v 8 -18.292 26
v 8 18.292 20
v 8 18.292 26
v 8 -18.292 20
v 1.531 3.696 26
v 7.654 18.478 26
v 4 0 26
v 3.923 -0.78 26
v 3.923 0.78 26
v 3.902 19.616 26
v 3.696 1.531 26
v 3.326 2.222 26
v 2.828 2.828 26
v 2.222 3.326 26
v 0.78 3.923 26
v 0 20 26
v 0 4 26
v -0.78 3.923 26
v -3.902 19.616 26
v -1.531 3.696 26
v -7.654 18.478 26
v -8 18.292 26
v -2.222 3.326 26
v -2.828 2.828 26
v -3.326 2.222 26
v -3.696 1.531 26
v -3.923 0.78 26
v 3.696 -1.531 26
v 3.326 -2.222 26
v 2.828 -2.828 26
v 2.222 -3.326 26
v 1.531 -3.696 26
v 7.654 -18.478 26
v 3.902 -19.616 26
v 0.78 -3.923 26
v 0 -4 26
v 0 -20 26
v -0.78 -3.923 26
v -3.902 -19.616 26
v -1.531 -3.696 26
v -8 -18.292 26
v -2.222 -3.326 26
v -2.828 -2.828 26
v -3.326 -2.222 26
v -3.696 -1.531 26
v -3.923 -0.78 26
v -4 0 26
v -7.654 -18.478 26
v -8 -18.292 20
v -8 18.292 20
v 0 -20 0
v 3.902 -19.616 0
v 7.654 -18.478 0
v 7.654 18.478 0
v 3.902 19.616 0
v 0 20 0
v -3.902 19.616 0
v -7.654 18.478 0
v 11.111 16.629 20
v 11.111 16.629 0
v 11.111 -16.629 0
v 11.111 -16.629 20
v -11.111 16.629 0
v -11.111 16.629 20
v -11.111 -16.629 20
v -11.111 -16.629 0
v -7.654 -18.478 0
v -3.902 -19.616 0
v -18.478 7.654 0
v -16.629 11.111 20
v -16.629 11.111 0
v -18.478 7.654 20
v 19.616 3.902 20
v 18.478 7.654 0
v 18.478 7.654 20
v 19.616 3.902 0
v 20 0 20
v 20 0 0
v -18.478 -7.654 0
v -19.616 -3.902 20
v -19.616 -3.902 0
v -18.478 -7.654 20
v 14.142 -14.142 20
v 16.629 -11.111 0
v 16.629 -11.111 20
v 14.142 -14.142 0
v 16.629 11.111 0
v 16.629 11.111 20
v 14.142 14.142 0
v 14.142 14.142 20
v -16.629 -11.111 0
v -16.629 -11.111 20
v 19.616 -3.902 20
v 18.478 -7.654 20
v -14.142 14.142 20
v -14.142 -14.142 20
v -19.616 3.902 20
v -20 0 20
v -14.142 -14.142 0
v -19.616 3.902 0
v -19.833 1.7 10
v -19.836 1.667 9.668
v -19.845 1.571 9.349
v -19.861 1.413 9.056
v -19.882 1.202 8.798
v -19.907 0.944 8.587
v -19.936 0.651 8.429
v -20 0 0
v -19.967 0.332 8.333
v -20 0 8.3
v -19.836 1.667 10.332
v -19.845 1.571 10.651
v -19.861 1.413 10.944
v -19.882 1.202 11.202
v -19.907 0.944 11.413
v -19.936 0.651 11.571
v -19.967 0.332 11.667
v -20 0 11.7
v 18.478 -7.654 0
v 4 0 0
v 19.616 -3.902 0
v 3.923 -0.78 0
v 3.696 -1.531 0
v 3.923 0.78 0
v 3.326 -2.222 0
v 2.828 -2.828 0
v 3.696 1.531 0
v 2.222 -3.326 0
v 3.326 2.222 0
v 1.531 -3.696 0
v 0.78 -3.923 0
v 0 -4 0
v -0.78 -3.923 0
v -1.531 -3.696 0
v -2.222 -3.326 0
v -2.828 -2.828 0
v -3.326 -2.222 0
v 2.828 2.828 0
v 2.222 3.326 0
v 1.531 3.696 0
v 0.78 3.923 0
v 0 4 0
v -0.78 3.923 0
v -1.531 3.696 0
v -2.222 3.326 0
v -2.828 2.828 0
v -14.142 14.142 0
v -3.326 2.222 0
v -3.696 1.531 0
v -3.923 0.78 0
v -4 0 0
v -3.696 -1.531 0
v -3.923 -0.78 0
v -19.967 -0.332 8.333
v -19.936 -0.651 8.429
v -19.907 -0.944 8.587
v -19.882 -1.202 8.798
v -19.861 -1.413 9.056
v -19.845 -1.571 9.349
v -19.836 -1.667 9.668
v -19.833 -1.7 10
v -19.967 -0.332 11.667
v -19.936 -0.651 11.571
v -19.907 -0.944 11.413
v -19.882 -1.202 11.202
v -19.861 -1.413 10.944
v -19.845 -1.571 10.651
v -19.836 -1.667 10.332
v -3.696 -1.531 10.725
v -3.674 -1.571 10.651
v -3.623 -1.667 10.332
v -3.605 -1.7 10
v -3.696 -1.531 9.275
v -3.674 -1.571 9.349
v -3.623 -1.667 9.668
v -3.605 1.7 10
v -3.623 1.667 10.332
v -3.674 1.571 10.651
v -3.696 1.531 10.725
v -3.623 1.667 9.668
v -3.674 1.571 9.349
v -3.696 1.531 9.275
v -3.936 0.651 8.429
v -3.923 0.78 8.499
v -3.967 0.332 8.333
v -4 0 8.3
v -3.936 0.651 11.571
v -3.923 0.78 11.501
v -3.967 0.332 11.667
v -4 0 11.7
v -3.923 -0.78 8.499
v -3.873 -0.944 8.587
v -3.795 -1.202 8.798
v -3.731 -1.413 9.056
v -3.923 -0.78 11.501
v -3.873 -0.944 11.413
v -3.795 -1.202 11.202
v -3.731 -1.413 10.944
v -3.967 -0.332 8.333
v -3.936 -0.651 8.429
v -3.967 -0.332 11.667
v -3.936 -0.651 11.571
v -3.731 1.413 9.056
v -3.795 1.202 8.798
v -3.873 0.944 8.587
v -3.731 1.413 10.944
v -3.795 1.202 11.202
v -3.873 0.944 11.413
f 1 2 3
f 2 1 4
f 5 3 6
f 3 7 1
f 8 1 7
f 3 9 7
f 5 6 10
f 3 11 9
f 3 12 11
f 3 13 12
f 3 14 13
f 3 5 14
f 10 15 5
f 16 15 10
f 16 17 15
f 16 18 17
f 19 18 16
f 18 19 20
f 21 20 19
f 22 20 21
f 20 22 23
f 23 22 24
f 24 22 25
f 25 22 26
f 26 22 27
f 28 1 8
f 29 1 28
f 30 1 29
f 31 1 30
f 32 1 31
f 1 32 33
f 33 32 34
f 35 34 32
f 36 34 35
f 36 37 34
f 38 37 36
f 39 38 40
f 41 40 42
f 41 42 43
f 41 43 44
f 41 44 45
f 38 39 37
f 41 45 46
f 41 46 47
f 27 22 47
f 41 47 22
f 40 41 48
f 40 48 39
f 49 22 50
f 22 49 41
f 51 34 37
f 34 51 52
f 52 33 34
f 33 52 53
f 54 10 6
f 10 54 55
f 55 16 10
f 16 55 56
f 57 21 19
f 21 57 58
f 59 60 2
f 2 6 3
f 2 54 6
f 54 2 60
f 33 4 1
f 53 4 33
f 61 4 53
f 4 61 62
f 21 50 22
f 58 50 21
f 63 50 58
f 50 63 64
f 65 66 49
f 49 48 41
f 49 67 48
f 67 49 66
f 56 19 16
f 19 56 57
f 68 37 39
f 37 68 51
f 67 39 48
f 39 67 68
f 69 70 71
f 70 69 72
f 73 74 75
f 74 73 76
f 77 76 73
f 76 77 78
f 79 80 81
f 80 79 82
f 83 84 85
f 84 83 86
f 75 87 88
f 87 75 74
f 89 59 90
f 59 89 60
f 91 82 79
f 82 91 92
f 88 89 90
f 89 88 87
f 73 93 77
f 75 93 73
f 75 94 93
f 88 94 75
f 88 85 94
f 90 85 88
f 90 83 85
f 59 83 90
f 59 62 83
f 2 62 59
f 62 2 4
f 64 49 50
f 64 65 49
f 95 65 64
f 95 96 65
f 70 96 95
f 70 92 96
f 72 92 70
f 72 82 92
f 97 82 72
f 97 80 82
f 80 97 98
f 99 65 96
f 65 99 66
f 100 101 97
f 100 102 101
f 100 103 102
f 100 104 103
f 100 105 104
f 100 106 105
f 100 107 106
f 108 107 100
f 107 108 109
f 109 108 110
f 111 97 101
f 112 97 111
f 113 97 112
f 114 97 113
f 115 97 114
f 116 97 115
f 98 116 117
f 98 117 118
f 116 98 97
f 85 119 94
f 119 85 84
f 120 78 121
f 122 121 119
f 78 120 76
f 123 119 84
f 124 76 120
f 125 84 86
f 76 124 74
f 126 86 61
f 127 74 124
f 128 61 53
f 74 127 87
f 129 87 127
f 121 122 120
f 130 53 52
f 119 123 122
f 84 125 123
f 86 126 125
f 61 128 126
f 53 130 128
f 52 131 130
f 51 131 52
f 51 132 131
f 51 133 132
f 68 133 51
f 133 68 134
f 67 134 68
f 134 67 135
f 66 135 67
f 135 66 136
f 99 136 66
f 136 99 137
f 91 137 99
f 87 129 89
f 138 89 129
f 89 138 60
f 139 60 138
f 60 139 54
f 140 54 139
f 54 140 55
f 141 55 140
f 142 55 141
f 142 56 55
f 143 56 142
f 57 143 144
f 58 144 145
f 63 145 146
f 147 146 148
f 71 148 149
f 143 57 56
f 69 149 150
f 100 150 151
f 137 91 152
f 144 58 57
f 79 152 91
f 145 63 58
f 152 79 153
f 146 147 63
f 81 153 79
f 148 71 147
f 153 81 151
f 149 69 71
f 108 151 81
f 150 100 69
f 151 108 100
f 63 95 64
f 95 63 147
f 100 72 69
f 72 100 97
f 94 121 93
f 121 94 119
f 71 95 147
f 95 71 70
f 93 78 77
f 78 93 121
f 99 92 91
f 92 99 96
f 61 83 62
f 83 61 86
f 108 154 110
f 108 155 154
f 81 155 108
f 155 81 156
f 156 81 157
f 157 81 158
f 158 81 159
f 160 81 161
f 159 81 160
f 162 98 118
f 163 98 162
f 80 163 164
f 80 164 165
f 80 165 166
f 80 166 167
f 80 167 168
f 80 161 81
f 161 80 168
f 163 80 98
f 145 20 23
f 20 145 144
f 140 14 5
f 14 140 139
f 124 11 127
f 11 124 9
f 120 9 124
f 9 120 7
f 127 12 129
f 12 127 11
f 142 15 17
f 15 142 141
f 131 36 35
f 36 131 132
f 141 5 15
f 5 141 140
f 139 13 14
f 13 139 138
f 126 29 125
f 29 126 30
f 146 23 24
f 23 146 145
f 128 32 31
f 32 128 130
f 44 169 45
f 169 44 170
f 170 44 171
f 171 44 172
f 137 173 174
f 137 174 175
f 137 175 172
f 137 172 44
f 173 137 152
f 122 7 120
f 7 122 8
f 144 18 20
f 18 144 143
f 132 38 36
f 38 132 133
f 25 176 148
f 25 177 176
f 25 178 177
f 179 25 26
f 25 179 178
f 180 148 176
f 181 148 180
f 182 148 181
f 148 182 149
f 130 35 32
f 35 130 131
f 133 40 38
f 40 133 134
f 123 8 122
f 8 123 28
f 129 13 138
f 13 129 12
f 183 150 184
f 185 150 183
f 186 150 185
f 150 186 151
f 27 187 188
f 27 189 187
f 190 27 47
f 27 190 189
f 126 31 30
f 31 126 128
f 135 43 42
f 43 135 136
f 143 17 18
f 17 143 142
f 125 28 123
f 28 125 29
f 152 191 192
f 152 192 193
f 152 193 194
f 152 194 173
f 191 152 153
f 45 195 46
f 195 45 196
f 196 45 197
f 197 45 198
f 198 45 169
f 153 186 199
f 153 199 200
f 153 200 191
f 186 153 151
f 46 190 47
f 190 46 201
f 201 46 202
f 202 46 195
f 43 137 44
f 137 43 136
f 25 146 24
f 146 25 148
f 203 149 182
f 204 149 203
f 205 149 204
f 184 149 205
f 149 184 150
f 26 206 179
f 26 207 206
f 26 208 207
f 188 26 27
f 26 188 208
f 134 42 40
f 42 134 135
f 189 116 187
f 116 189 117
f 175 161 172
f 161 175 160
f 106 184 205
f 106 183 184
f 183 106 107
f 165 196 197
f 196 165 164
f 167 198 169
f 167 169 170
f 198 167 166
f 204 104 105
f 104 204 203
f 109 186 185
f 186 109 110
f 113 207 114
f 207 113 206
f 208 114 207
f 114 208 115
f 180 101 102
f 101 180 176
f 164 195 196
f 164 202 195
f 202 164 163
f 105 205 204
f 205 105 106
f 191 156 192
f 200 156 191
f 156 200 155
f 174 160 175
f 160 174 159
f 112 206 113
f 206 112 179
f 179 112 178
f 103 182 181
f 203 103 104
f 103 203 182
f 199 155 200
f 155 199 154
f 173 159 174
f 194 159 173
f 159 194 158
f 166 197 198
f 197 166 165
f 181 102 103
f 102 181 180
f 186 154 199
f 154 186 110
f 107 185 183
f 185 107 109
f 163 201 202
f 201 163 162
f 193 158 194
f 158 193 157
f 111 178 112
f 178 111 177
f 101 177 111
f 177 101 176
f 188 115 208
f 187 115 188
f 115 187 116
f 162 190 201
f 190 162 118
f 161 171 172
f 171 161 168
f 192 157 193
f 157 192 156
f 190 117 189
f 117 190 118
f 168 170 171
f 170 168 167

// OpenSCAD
$fn = 32;

// ----------------------------------------------------------------------
// Oldham coupling hub: 40 x 26 mm
// ----------------------------------------------------------------------

// --- parameters (mm) ---
body_d = 40;              // hub diameter
body_l = 20;              // hub length
shaft_d = 8;              // shaft bore
cam_w = 16;               // drive tongue width
tongue_h = 6;             // drive tongue height
set_d = 3.4;              // set screw tap hole

module hub() {
  cylinder(h = body_l, d = body_d);
  /* tongue, clipped to the hub disc and sunk 1 mm into the face */
  intersection() {
    translate([-cam_w / 2, -body_d / 2, body_l - 1])
      cube([cam_w, body_d, tongue_h + 1]);
    translate([0, 0, body_l - 1]) cylinder(h = tongue_h + 1, d = body_d);
  }
}

difference() {
  hub();
  translate([0, 0, -1]) cylinder(h = body_l + tongue_h + 2, d = shaft_d);
  translate([-body_d / 2 - 1, 0, body_l * 0.5])
    rotate([0, 90, 0]) cylinder(h = body_d / 2 + 2, d = set_d);
}
